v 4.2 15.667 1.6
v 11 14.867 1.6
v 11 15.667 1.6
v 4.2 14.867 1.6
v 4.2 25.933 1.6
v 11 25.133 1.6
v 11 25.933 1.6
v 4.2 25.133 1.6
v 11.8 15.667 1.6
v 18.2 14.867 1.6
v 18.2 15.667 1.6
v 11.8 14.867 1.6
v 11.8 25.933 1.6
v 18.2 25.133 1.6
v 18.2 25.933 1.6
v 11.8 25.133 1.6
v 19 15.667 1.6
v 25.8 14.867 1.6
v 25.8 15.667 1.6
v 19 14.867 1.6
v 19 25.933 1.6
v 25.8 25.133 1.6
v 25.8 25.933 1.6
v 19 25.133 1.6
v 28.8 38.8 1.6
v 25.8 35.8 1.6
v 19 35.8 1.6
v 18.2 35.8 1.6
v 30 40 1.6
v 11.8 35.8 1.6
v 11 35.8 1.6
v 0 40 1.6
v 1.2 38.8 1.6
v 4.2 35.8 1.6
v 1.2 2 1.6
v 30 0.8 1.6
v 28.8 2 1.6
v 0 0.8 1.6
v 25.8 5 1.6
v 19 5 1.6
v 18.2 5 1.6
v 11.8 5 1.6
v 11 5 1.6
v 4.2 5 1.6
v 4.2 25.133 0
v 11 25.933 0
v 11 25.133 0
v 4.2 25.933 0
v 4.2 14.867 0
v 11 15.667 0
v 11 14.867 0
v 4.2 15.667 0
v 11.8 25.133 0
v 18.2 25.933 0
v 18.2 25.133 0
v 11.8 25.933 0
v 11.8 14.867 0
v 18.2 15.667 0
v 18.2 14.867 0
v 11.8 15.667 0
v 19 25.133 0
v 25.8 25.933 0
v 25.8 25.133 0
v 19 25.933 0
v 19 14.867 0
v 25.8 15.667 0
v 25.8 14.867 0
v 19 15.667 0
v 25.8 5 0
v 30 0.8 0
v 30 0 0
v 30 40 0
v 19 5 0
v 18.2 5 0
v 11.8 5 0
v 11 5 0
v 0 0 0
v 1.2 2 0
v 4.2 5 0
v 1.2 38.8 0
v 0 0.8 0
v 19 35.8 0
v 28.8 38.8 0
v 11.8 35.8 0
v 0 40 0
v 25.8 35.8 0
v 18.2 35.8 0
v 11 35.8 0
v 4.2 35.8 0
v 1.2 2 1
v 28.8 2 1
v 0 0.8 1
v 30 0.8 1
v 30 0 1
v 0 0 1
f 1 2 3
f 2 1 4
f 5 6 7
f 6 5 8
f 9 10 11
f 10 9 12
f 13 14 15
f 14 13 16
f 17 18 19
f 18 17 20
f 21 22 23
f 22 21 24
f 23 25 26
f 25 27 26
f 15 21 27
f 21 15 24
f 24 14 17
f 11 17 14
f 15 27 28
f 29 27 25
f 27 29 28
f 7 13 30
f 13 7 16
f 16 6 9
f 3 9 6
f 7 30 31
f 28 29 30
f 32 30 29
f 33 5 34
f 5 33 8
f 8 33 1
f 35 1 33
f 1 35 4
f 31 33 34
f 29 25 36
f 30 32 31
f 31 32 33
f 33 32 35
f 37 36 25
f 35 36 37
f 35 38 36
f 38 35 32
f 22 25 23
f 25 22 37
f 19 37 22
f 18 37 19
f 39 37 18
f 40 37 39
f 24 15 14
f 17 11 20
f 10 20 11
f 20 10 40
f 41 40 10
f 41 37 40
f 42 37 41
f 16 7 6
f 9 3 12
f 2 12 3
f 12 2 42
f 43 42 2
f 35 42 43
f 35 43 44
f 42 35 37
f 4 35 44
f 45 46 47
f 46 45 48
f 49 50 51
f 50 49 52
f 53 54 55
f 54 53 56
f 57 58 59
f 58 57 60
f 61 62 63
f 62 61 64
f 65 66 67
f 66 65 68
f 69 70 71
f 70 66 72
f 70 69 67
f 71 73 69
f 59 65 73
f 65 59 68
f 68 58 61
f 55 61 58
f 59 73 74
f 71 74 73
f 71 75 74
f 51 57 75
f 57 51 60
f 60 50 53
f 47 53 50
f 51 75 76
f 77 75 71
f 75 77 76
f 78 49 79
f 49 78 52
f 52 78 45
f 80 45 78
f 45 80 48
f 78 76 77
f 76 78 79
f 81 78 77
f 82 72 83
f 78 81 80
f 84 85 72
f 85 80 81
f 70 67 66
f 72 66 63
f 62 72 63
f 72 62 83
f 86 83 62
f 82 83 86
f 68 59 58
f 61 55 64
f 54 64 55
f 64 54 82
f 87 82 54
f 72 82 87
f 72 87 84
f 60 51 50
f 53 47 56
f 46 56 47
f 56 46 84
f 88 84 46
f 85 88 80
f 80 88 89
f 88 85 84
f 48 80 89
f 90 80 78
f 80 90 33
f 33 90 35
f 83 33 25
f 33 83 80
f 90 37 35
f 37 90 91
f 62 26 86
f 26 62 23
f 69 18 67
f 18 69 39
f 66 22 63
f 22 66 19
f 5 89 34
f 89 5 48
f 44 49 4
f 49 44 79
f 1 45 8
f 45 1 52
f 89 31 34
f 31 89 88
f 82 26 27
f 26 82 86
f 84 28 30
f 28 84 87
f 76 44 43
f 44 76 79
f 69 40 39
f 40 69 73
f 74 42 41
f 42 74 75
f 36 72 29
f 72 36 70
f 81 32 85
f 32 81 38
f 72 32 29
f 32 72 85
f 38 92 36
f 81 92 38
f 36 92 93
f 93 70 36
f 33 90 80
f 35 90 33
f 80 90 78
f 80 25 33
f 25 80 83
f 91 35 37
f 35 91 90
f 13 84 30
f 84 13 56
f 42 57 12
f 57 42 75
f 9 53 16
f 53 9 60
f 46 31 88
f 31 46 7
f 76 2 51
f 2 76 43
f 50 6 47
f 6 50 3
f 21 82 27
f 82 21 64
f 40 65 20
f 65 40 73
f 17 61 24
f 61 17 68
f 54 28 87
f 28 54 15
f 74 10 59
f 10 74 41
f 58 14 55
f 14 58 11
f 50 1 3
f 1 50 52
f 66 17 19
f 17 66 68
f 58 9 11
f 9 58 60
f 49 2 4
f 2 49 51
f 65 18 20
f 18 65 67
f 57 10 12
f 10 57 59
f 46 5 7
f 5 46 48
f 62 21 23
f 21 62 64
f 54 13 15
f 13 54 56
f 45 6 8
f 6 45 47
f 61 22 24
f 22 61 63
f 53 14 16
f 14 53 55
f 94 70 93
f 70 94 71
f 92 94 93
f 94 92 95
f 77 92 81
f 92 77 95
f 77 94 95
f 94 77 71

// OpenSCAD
//////////////////////////////////////////////////////////////
// ULTIMATE PARAMETRIC WINDOW GENERATOR
// Designed for OpenSCAD Customizer
//////////////////////////////////////////////////////////////

/* [1. Window Size] */
window_width = 30;      // [10:1:200]
window_height = 40;     // [10:1:200]
depth = 1.6;            // [0.6:0.2:10]

/* [2. Grid Layout] */
columns = 3;            // [1:1:10]
rows = 3;               // [1:1:10]

/* [3. Advanced Proportions] */
// Turn ON to make the top/bottom rows different sizes
enable_custom_proportions = false; 
// Size of the TOP panes
top_pane_size = 0.5;    // [0.3:Very Short, 0.5:Short, 1.0:Standard, 1.5:Tall, 2.0:Very Tall]
// Size of the BOTTOM panes
bottom_pane_size = 0.5; // [0.3:Very Short, 0.5:Short, 1.0:Standard, 1.5:Tall, 2.0:Very Tall]

/* [4. Architectural Details] */
enable_arch = false;        
arch_height = 15;       // [2:1:50]
enable_sill = true;        
sill_depth = 2;         // [0:0.5:10]
sill_height = 1;        // [0:0.5:5]

/* [5. Frame Thickness (Advanced)] */
frame_thickness = 3;    // [0.4:0.5:10]
muntin_thickness = 0.8; // [0.3:0.1:5]
cornice_overhang = 1.2; // [0:0.1:5]
cornice_height = 1.6;   // [0.5:0.1:5]

//////////////////////////////////////////////////////////////
// GENERATOR ENGINE (Do not edit below)
//////////////////////////////////////////////////////////////

// 1. Calculate effective inner dimensions so overall bounds match requested width & height perfectly
eff_w = window_width - (2 * cornice_overhang);

bottom_prot = enable_sill ? sill_depth : cornice_overhang;
top_prot = enable_arch ? (arch_height + cornice_overhang * (arch_height / (eff_w / 2))) : cornice_overhang;

eff_h = window_height - bottom_prot - top_prot;

generate_window();

module generate_window(){
    // 2. Shift the entire object so bottom-left is exactly at [0,0,0]
    translate([cornice_overhang, bottom_prot, 0])
    union(){
        if(enable_arch == false) flat_window();
        else arched_window();
        if(enable_sill == true) window_sill();
    }
}

module flat_window(){
    decorative_frame();
    muntins(false);
}

module arched_window(){
    union(){
        decorative_frame(true); 
        translate([eff_w/2, eff_h, 0])
        scale([1, arch_height / (eff_w/2), 1]) {
            difference() {
                cylinder(h=cornice_height, r=eff_w/2 + cornice_overhang, $fn=80);
                translate([0,0,-0.1]) cylinder(h=cornice_height+0.2, r=eff_w/2, $fn=80);
                translate([-eff_w, -eff_w, -1]) cube([eff_w*2, eff_w, cornice_height+2]);
            }
            difference() {
                cylinder(h=depth, r=eff_w/2, $fn=80);
                translate([0,0,-0.1]) cylinder(h=depth+0.2, r=(eff_w/2) - frame_thickness, $fn=80);
                translate([-eff_w, -eff_w, -1]) cube([eff_w*2, eff_w, depth+2]);
            }
        }
        intersection(){
            muntins(true);
            union(){
                cube([eff_w, eff_h, depth]);
                translate([eff_w/2, eff_h, 0])
                    scale([1, arch_height / (eff_w/2), 1])
                        cylinder(h=depth, r=(eff_w/2) - frame_thickness, $fn=80);
            }
        }
    }
}

module decorative_frame(is_arch = false){
    union(){
        difference(){
            cube([eff_w, eff_h, depth]);
            translate([frame_thickness, frame_thickness, -0.1])
            cube([eff_w - 2*frame_thickness, eff_h - 2*frame_thickness + (is_arch ? frame_thickness + 0.1 : 0), depth + 0.2]);
        }
        if (cornice_overhang > 0) {
            translate([-cornice_overhang, -cornice_overhang, 0])
            difference(){
                cube([eff_w + 2*cornice_overhang, eff_h + 2*cornice_overhang - (is_arch ? cornice_overhang : 0), cornice_height]);
                translate([cornice_overhang, cornice_overhang, -0.1])
                cube([eff_w, eff_h + (is_arch ? cornice_overhang + 0.1 : 0), cornice_height + 0.2]);
            }
        }
    }
}

module muntins(is_arch = false){
    // Vertical bars
    if(columns > 1){
        pane_w = (eff_w - 2*frame_thickness) / columns;
        for(i = [1 : columns-1]) {
            translate([frame_thickness + pane_w*i - muntin_thickness/2, frame_thickness, 0])
            cube([muntin_thickness, eff_h - 2*frame_thickness + (is_arch ? arch_height : 0), depth]);
        }
    }

    // Horizontal bars
    if(rows > 1){
        inner_h = eff_h - 2*frame_thickness;
        
        // Calculate units
        total_units = (enable_custom_proportions == false) ? rows :
                      (rows == 2) ? (top_pane_size + bottom_pane_size) :
                      (top_pane_size + bottom_pane_size + (rows - 2));
                      
        unit_h = inner_h / total_units;

        for(j = [1 : rows - 1]) {
            y_pos = (enable_custom_proportions == false) ? 
                    (frame_thickness + j * unit_h) :
                    (frame_thickness + (bottom_pane_size * unit_h) + ((j - 1) * unit_h));

            translate([frame_thickness, y_pos - muntin_thickness/2, 0])
            cube([eff_w - 2*frame_thickness, muntin_thickness, depth]);
        }
    }
}

module window_sill(){
    translate([-cornice_overhang, -sill_depth, 0])
    cube([eff_w + cornice_overhang*2, sill_depth, sill_height]);
}
